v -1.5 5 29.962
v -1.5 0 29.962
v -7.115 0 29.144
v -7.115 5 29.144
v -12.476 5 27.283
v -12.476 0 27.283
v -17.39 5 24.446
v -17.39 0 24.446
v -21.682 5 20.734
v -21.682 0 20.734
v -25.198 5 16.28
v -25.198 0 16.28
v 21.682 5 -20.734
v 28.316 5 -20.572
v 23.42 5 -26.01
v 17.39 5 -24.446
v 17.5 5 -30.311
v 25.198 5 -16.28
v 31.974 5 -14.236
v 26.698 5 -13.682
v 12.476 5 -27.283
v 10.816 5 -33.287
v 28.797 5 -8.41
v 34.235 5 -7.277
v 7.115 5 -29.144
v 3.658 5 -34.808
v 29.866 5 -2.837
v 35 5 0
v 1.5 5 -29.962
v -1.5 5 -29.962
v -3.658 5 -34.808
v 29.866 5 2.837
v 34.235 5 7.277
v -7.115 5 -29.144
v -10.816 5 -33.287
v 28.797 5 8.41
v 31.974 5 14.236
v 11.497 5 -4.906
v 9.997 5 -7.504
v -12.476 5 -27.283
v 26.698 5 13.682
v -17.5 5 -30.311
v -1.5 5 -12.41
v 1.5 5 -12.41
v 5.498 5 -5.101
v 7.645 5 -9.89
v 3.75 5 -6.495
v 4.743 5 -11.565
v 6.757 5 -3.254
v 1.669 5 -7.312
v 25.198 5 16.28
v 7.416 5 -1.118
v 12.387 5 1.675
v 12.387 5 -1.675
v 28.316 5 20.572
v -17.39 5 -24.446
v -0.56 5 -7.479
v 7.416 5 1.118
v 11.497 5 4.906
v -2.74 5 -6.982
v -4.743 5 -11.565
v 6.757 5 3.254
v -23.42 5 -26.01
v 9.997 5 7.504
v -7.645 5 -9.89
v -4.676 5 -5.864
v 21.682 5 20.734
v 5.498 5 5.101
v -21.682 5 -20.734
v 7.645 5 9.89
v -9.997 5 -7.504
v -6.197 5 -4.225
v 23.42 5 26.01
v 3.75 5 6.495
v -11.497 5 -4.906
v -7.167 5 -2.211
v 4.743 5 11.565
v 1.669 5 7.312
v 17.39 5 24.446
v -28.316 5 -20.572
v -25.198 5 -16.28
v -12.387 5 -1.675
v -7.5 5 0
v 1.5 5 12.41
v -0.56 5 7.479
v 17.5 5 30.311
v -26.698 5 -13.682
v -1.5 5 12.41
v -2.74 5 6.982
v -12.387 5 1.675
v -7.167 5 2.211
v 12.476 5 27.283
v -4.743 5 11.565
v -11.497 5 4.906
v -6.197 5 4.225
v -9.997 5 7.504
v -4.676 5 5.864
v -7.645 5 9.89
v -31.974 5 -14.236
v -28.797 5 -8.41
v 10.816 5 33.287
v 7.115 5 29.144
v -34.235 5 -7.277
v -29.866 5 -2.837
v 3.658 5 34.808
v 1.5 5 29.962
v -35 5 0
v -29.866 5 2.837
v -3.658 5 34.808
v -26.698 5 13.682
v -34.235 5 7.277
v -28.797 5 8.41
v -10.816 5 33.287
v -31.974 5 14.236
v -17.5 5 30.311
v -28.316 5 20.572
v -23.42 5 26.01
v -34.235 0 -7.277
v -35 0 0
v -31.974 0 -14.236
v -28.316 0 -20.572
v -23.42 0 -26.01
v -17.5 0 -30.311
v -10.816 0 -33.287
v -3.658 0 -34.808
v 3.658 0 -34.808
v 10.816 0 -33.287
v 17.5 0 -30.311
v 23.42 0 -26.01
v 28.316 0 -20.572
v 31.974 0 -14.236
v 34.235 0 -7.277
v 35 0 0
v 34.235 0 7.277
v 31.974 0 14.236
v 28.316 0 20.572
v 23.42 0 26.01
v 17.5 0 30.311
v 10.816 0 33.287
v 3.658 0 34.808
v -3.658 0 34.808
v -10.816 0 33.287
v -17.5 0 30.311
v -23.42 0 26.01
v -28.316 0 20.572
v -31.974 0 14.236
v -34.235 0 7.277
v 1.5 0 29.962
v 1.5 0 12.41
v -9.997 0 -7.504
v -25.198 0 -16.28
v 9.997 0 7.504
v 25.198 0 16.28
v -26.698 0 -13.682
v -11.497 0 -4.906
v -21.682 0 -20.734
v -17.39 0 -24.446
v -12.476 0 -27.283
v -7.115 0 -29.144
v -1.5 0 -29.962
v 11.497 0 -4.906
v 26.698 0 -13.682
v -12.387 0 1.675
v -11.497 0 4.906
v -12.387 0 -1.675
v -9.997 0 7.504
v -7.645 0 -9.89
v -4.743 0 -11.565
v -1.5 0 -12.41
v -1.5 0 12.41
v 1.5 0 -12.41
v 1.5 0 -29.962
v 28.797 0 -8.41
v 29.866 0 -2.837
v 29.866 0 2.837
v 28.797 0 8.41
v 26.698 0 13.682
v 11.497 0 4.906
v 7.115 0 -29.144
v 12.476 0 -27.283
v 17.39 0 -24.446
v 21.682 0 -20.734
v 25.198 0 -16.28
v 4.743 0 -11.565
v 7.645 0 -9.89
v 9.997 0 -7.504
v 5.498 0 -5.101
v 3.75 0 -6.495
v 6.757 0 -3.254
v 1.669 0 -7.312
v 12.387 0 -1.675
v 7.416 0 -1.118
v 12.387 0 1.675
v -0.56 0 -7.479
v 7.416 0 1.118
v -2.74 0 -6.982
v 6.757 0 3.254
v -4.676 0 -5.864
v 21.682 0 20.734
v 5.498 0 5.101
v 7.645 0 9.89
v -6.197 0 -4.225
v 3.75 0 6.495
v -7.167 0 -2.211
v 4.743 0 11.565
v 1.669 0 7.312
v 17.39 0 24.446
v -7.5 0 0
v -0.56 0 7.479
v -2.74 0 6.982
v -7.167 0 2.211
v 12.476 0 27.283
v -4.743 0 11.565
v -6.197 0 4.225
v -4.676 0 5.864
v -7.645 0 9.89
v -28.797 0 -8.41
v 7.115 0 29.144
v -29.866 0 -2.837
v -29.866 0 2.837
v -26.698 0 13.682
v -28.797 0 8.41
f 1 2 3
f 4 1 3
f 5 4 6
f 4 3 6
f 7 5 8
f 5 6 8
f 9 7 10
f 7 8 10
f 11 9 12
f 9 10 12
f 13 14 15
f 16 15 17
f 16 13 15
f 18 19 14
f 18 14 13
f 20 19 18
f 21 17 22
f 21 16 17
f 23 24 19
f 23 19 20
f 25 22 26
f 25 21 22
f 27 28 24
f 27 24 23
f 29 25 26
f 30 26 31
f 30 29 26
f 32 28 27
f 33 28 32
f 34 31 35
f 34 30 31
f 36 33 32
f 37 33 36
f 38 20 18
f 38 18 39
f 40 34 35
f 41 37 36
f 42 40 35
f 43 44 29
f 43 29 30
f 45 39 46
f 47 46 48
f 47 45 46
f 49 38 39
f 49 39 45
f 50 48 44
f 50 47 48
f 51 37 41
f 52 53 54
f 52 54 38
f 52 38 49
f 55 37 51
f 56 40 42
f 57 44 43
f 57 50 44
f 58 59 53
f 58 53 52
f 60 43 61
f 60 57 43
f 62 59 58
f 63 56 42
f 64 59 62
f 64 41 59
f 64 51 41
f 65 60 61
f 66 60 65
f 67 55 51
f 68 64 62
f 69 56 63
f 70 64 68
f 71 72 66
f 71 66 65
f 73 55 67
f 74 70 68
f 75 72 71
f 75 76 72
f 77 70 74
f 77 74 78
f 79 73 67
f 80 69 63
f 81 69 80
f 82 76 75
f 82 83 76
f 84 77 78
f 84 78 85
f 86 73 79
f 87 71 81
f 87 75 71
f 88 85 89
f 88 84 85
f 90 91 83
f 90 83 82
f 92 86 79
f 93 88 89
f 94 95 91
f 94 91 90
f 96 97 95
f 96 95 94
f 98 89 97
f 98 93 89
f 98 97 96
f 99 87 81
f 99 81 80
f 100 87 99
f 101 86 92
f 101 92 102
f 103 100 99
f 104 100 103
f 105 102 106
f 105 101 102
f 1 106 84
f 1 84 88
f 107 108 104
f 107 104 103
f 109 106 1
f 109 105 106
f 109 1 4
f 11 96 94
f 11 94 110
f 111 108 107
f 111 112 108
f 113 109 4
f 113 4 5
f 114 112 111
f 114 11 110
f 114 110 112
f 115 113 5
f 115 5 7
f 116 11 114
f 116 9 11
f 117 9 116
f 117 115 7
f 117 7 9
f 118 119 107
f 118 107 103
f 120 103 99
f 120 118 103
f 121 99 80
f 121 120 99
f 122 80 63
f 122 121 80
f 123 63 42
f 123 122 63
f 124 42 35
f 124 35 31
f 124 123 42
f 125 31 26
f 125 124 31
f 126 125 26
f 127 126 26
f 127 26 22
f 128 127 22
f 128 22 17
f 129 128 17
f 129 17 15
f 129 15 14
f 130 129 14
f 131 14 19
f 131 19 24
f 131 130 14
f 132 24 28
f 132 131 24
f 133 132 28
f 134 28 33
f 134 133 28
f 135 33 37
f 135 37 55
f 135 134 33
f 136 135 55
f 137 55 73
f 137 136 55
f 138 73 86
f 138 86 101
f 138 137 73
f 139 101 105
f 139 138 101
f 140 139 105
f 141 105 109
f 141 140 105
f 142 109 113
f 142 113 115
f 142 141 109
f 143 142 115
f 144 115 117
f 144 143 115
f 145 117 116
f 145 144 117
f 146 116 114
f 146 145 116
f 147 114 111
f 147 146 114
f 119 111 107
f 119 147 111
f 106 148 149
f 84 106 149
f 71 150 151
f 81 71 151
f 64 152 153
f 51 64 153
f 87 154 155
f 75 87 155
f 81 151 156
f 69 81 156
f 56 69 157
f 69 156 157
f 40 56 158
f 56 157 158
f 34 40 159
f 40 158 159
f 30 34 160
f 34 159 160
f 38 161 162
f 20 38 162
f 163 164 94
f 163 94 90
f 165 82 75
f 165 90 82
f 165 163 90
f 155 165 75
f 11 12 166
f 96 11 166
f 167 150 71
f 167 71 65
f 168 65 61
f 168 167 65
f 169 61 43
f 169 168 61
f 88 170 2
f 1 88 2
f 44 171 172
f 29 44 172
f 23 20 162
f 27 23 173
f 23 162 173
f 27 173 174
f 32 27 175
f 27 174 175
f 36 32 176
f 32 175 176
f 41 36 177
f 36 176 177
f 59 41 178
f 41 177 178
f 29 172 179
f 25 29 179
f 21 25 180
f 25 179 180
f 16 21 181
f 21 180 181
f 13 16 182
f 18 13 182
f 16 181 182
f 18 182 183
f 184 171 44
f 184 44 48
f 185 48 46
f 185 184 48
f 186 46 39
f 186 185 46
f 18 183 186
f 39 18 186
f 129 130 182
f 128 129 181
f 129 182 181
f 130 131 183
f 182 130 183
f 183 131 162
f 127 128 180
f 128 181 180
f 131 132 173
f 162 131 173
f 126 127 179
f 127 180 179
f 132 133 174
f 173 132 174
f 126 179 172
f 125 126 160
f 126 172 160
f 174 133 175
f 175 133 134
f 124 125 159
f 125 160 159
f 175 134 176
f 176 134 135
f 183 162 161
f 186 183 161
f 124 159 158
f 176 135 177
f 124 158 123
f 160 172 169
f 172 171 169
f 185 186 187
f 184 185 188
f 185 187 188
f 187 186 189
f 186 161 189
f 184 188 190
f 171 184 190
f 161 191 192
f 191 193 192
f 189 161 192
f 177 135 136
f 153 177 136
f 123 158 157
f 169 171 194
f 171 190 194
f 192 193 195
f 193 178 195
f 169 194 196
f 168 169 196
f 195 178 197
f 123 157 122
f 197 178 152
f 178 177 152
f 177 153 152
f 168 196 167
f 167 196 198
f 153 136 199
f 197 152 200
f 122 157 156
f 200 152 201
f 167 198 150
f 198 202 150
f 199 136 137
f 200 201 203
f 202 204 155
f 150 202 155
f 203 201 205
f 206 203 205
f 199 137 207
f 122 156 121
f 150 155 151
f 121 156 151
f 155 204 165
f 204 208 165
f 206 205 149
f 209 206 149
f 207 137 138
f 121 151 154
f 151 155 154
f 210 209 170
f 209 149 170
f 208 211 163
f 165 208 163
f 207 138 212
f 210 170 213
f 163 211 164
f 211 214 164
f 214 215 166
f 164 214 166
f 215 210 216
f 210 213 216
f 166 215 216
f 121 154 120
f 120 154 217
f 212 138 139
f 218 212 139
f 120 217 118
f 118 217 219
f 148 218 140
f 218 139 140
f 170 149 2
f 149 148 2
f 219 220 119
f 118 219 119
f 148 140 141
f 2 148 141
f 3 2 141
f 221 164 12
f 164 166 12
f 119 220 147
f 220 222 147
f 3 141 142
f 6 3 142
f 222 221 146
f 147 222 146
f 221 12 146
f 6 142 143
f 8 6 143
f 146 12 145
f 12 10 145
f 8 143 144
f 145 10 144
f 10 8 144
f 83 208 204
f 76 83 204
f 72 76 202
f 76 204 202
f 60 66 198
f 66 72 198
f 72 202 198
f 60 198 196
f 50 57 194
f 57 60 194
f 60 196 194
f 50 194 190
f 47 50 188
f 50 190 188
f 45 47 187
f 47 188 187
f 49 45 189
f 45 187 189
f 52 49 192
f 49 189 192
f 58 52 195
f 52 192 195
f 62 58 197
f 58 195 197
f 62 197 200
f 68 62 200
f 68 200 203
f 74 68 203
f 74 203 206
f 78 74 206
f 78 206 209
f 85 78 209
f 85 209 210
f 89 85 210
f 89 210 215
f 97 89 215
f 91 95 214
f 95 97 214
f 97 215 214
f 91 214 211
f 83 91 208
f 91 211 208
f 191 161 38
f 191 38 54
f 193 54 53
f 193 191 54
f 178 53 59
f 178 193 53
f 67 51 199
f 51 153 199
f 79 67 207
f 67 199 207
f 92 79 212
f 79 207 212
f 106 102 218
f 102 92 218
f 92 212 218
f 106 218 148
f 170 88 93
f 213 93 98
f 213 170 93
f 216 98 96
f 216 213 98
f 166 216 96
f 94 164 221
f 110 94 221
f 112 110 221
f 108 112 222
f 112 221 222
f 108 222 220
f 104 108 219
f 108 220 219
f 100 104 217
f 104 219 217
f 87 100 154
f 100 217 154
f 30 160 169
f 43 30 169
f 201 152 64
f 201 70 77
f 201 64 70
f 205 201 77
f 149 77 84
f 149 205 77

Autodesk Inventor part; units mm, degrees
ref_plane "YZ Plane" through (0, 0, 0) normal (1, 0, 0) x (0, 1, 0)
ref_plane "XZ Plane" through (0, 0, 0) normal (0, 1, 0) x (-1, 0, 0)
ref_plane "XY Plane" through (0, 0, 0) normal (0, 0, 1) x (1, 0, 0)
sketch "스케치1" plane through (0, 0, 0) normal (0, 1, 0) x (-1, 0, 0)
  circle A0 centre (0, 0) radius 35
  circle A1 centre (0, 0) radius 7.5
  circle A2 centre (0, 0) radius 12.5
  circle A3 centre (0, 0) radius 30
  dimension "d0" = 70
  dimension "d1" = 15
  dimension "d2" = 25
  dimension "d3" = 60
extrude "돌출1" add sketch "스케치1" along normal blind 5
sketch "스케치2" plane through (0, 0, 0) normal (0, -1, 0) x (1, 0, 0)
  line L0 (-10.8253, 6.25) -> (-25.9808, 15)
  circle A0 centre (0, 0) radius 30 projected
  circle A1 centre (0, 0) radius 7.5 projected
  circle A2 centre (0, 0) radius 7.5 projected
  circle A3 centre (0, 0) radius 12.5 projected
  circle A4 centre (0, 0) radius 12.5 projected
  line L1 (0, 12.5) -> (0, 30)
  line L2 (10.8253, 6.25) -> (25.9808, 15)
  line L3 (10.8253, -6.25) -> (25.9808, -15)
  line L4 (0, -12.5) -> (0, -30)
  line L5 (-10.8253, -6.25) -> (-25.9808, -15)
  line L6 (-1.5, 34.9678) -> (1.5, 34.9678)
  line L7 (1.5, 34.9678) -> (1.5, 12.4097)
  line L8 (1.5, 12.4097) -> (-1.5, 12.4097)
  line L9 (-1.5, 12.4097) -> (-1.5, 34.9678)
  circle A5 centre (0, 0) radius 35 projected
  dimension "d10" = 3
  dimension "d11" = 1.5
extrude "돌출2" add sketch "스케치2" against normal blind 5 contours L9 A0 L1 A3 | L9 L6 L7 A0 | L1 A0 L7 A3
pattern_circular "원형 패턴1" count 6 over 360 about axis through (0, 0, 0) along (0, 1, 0) of "돌출2"
properties part number "부품2"
